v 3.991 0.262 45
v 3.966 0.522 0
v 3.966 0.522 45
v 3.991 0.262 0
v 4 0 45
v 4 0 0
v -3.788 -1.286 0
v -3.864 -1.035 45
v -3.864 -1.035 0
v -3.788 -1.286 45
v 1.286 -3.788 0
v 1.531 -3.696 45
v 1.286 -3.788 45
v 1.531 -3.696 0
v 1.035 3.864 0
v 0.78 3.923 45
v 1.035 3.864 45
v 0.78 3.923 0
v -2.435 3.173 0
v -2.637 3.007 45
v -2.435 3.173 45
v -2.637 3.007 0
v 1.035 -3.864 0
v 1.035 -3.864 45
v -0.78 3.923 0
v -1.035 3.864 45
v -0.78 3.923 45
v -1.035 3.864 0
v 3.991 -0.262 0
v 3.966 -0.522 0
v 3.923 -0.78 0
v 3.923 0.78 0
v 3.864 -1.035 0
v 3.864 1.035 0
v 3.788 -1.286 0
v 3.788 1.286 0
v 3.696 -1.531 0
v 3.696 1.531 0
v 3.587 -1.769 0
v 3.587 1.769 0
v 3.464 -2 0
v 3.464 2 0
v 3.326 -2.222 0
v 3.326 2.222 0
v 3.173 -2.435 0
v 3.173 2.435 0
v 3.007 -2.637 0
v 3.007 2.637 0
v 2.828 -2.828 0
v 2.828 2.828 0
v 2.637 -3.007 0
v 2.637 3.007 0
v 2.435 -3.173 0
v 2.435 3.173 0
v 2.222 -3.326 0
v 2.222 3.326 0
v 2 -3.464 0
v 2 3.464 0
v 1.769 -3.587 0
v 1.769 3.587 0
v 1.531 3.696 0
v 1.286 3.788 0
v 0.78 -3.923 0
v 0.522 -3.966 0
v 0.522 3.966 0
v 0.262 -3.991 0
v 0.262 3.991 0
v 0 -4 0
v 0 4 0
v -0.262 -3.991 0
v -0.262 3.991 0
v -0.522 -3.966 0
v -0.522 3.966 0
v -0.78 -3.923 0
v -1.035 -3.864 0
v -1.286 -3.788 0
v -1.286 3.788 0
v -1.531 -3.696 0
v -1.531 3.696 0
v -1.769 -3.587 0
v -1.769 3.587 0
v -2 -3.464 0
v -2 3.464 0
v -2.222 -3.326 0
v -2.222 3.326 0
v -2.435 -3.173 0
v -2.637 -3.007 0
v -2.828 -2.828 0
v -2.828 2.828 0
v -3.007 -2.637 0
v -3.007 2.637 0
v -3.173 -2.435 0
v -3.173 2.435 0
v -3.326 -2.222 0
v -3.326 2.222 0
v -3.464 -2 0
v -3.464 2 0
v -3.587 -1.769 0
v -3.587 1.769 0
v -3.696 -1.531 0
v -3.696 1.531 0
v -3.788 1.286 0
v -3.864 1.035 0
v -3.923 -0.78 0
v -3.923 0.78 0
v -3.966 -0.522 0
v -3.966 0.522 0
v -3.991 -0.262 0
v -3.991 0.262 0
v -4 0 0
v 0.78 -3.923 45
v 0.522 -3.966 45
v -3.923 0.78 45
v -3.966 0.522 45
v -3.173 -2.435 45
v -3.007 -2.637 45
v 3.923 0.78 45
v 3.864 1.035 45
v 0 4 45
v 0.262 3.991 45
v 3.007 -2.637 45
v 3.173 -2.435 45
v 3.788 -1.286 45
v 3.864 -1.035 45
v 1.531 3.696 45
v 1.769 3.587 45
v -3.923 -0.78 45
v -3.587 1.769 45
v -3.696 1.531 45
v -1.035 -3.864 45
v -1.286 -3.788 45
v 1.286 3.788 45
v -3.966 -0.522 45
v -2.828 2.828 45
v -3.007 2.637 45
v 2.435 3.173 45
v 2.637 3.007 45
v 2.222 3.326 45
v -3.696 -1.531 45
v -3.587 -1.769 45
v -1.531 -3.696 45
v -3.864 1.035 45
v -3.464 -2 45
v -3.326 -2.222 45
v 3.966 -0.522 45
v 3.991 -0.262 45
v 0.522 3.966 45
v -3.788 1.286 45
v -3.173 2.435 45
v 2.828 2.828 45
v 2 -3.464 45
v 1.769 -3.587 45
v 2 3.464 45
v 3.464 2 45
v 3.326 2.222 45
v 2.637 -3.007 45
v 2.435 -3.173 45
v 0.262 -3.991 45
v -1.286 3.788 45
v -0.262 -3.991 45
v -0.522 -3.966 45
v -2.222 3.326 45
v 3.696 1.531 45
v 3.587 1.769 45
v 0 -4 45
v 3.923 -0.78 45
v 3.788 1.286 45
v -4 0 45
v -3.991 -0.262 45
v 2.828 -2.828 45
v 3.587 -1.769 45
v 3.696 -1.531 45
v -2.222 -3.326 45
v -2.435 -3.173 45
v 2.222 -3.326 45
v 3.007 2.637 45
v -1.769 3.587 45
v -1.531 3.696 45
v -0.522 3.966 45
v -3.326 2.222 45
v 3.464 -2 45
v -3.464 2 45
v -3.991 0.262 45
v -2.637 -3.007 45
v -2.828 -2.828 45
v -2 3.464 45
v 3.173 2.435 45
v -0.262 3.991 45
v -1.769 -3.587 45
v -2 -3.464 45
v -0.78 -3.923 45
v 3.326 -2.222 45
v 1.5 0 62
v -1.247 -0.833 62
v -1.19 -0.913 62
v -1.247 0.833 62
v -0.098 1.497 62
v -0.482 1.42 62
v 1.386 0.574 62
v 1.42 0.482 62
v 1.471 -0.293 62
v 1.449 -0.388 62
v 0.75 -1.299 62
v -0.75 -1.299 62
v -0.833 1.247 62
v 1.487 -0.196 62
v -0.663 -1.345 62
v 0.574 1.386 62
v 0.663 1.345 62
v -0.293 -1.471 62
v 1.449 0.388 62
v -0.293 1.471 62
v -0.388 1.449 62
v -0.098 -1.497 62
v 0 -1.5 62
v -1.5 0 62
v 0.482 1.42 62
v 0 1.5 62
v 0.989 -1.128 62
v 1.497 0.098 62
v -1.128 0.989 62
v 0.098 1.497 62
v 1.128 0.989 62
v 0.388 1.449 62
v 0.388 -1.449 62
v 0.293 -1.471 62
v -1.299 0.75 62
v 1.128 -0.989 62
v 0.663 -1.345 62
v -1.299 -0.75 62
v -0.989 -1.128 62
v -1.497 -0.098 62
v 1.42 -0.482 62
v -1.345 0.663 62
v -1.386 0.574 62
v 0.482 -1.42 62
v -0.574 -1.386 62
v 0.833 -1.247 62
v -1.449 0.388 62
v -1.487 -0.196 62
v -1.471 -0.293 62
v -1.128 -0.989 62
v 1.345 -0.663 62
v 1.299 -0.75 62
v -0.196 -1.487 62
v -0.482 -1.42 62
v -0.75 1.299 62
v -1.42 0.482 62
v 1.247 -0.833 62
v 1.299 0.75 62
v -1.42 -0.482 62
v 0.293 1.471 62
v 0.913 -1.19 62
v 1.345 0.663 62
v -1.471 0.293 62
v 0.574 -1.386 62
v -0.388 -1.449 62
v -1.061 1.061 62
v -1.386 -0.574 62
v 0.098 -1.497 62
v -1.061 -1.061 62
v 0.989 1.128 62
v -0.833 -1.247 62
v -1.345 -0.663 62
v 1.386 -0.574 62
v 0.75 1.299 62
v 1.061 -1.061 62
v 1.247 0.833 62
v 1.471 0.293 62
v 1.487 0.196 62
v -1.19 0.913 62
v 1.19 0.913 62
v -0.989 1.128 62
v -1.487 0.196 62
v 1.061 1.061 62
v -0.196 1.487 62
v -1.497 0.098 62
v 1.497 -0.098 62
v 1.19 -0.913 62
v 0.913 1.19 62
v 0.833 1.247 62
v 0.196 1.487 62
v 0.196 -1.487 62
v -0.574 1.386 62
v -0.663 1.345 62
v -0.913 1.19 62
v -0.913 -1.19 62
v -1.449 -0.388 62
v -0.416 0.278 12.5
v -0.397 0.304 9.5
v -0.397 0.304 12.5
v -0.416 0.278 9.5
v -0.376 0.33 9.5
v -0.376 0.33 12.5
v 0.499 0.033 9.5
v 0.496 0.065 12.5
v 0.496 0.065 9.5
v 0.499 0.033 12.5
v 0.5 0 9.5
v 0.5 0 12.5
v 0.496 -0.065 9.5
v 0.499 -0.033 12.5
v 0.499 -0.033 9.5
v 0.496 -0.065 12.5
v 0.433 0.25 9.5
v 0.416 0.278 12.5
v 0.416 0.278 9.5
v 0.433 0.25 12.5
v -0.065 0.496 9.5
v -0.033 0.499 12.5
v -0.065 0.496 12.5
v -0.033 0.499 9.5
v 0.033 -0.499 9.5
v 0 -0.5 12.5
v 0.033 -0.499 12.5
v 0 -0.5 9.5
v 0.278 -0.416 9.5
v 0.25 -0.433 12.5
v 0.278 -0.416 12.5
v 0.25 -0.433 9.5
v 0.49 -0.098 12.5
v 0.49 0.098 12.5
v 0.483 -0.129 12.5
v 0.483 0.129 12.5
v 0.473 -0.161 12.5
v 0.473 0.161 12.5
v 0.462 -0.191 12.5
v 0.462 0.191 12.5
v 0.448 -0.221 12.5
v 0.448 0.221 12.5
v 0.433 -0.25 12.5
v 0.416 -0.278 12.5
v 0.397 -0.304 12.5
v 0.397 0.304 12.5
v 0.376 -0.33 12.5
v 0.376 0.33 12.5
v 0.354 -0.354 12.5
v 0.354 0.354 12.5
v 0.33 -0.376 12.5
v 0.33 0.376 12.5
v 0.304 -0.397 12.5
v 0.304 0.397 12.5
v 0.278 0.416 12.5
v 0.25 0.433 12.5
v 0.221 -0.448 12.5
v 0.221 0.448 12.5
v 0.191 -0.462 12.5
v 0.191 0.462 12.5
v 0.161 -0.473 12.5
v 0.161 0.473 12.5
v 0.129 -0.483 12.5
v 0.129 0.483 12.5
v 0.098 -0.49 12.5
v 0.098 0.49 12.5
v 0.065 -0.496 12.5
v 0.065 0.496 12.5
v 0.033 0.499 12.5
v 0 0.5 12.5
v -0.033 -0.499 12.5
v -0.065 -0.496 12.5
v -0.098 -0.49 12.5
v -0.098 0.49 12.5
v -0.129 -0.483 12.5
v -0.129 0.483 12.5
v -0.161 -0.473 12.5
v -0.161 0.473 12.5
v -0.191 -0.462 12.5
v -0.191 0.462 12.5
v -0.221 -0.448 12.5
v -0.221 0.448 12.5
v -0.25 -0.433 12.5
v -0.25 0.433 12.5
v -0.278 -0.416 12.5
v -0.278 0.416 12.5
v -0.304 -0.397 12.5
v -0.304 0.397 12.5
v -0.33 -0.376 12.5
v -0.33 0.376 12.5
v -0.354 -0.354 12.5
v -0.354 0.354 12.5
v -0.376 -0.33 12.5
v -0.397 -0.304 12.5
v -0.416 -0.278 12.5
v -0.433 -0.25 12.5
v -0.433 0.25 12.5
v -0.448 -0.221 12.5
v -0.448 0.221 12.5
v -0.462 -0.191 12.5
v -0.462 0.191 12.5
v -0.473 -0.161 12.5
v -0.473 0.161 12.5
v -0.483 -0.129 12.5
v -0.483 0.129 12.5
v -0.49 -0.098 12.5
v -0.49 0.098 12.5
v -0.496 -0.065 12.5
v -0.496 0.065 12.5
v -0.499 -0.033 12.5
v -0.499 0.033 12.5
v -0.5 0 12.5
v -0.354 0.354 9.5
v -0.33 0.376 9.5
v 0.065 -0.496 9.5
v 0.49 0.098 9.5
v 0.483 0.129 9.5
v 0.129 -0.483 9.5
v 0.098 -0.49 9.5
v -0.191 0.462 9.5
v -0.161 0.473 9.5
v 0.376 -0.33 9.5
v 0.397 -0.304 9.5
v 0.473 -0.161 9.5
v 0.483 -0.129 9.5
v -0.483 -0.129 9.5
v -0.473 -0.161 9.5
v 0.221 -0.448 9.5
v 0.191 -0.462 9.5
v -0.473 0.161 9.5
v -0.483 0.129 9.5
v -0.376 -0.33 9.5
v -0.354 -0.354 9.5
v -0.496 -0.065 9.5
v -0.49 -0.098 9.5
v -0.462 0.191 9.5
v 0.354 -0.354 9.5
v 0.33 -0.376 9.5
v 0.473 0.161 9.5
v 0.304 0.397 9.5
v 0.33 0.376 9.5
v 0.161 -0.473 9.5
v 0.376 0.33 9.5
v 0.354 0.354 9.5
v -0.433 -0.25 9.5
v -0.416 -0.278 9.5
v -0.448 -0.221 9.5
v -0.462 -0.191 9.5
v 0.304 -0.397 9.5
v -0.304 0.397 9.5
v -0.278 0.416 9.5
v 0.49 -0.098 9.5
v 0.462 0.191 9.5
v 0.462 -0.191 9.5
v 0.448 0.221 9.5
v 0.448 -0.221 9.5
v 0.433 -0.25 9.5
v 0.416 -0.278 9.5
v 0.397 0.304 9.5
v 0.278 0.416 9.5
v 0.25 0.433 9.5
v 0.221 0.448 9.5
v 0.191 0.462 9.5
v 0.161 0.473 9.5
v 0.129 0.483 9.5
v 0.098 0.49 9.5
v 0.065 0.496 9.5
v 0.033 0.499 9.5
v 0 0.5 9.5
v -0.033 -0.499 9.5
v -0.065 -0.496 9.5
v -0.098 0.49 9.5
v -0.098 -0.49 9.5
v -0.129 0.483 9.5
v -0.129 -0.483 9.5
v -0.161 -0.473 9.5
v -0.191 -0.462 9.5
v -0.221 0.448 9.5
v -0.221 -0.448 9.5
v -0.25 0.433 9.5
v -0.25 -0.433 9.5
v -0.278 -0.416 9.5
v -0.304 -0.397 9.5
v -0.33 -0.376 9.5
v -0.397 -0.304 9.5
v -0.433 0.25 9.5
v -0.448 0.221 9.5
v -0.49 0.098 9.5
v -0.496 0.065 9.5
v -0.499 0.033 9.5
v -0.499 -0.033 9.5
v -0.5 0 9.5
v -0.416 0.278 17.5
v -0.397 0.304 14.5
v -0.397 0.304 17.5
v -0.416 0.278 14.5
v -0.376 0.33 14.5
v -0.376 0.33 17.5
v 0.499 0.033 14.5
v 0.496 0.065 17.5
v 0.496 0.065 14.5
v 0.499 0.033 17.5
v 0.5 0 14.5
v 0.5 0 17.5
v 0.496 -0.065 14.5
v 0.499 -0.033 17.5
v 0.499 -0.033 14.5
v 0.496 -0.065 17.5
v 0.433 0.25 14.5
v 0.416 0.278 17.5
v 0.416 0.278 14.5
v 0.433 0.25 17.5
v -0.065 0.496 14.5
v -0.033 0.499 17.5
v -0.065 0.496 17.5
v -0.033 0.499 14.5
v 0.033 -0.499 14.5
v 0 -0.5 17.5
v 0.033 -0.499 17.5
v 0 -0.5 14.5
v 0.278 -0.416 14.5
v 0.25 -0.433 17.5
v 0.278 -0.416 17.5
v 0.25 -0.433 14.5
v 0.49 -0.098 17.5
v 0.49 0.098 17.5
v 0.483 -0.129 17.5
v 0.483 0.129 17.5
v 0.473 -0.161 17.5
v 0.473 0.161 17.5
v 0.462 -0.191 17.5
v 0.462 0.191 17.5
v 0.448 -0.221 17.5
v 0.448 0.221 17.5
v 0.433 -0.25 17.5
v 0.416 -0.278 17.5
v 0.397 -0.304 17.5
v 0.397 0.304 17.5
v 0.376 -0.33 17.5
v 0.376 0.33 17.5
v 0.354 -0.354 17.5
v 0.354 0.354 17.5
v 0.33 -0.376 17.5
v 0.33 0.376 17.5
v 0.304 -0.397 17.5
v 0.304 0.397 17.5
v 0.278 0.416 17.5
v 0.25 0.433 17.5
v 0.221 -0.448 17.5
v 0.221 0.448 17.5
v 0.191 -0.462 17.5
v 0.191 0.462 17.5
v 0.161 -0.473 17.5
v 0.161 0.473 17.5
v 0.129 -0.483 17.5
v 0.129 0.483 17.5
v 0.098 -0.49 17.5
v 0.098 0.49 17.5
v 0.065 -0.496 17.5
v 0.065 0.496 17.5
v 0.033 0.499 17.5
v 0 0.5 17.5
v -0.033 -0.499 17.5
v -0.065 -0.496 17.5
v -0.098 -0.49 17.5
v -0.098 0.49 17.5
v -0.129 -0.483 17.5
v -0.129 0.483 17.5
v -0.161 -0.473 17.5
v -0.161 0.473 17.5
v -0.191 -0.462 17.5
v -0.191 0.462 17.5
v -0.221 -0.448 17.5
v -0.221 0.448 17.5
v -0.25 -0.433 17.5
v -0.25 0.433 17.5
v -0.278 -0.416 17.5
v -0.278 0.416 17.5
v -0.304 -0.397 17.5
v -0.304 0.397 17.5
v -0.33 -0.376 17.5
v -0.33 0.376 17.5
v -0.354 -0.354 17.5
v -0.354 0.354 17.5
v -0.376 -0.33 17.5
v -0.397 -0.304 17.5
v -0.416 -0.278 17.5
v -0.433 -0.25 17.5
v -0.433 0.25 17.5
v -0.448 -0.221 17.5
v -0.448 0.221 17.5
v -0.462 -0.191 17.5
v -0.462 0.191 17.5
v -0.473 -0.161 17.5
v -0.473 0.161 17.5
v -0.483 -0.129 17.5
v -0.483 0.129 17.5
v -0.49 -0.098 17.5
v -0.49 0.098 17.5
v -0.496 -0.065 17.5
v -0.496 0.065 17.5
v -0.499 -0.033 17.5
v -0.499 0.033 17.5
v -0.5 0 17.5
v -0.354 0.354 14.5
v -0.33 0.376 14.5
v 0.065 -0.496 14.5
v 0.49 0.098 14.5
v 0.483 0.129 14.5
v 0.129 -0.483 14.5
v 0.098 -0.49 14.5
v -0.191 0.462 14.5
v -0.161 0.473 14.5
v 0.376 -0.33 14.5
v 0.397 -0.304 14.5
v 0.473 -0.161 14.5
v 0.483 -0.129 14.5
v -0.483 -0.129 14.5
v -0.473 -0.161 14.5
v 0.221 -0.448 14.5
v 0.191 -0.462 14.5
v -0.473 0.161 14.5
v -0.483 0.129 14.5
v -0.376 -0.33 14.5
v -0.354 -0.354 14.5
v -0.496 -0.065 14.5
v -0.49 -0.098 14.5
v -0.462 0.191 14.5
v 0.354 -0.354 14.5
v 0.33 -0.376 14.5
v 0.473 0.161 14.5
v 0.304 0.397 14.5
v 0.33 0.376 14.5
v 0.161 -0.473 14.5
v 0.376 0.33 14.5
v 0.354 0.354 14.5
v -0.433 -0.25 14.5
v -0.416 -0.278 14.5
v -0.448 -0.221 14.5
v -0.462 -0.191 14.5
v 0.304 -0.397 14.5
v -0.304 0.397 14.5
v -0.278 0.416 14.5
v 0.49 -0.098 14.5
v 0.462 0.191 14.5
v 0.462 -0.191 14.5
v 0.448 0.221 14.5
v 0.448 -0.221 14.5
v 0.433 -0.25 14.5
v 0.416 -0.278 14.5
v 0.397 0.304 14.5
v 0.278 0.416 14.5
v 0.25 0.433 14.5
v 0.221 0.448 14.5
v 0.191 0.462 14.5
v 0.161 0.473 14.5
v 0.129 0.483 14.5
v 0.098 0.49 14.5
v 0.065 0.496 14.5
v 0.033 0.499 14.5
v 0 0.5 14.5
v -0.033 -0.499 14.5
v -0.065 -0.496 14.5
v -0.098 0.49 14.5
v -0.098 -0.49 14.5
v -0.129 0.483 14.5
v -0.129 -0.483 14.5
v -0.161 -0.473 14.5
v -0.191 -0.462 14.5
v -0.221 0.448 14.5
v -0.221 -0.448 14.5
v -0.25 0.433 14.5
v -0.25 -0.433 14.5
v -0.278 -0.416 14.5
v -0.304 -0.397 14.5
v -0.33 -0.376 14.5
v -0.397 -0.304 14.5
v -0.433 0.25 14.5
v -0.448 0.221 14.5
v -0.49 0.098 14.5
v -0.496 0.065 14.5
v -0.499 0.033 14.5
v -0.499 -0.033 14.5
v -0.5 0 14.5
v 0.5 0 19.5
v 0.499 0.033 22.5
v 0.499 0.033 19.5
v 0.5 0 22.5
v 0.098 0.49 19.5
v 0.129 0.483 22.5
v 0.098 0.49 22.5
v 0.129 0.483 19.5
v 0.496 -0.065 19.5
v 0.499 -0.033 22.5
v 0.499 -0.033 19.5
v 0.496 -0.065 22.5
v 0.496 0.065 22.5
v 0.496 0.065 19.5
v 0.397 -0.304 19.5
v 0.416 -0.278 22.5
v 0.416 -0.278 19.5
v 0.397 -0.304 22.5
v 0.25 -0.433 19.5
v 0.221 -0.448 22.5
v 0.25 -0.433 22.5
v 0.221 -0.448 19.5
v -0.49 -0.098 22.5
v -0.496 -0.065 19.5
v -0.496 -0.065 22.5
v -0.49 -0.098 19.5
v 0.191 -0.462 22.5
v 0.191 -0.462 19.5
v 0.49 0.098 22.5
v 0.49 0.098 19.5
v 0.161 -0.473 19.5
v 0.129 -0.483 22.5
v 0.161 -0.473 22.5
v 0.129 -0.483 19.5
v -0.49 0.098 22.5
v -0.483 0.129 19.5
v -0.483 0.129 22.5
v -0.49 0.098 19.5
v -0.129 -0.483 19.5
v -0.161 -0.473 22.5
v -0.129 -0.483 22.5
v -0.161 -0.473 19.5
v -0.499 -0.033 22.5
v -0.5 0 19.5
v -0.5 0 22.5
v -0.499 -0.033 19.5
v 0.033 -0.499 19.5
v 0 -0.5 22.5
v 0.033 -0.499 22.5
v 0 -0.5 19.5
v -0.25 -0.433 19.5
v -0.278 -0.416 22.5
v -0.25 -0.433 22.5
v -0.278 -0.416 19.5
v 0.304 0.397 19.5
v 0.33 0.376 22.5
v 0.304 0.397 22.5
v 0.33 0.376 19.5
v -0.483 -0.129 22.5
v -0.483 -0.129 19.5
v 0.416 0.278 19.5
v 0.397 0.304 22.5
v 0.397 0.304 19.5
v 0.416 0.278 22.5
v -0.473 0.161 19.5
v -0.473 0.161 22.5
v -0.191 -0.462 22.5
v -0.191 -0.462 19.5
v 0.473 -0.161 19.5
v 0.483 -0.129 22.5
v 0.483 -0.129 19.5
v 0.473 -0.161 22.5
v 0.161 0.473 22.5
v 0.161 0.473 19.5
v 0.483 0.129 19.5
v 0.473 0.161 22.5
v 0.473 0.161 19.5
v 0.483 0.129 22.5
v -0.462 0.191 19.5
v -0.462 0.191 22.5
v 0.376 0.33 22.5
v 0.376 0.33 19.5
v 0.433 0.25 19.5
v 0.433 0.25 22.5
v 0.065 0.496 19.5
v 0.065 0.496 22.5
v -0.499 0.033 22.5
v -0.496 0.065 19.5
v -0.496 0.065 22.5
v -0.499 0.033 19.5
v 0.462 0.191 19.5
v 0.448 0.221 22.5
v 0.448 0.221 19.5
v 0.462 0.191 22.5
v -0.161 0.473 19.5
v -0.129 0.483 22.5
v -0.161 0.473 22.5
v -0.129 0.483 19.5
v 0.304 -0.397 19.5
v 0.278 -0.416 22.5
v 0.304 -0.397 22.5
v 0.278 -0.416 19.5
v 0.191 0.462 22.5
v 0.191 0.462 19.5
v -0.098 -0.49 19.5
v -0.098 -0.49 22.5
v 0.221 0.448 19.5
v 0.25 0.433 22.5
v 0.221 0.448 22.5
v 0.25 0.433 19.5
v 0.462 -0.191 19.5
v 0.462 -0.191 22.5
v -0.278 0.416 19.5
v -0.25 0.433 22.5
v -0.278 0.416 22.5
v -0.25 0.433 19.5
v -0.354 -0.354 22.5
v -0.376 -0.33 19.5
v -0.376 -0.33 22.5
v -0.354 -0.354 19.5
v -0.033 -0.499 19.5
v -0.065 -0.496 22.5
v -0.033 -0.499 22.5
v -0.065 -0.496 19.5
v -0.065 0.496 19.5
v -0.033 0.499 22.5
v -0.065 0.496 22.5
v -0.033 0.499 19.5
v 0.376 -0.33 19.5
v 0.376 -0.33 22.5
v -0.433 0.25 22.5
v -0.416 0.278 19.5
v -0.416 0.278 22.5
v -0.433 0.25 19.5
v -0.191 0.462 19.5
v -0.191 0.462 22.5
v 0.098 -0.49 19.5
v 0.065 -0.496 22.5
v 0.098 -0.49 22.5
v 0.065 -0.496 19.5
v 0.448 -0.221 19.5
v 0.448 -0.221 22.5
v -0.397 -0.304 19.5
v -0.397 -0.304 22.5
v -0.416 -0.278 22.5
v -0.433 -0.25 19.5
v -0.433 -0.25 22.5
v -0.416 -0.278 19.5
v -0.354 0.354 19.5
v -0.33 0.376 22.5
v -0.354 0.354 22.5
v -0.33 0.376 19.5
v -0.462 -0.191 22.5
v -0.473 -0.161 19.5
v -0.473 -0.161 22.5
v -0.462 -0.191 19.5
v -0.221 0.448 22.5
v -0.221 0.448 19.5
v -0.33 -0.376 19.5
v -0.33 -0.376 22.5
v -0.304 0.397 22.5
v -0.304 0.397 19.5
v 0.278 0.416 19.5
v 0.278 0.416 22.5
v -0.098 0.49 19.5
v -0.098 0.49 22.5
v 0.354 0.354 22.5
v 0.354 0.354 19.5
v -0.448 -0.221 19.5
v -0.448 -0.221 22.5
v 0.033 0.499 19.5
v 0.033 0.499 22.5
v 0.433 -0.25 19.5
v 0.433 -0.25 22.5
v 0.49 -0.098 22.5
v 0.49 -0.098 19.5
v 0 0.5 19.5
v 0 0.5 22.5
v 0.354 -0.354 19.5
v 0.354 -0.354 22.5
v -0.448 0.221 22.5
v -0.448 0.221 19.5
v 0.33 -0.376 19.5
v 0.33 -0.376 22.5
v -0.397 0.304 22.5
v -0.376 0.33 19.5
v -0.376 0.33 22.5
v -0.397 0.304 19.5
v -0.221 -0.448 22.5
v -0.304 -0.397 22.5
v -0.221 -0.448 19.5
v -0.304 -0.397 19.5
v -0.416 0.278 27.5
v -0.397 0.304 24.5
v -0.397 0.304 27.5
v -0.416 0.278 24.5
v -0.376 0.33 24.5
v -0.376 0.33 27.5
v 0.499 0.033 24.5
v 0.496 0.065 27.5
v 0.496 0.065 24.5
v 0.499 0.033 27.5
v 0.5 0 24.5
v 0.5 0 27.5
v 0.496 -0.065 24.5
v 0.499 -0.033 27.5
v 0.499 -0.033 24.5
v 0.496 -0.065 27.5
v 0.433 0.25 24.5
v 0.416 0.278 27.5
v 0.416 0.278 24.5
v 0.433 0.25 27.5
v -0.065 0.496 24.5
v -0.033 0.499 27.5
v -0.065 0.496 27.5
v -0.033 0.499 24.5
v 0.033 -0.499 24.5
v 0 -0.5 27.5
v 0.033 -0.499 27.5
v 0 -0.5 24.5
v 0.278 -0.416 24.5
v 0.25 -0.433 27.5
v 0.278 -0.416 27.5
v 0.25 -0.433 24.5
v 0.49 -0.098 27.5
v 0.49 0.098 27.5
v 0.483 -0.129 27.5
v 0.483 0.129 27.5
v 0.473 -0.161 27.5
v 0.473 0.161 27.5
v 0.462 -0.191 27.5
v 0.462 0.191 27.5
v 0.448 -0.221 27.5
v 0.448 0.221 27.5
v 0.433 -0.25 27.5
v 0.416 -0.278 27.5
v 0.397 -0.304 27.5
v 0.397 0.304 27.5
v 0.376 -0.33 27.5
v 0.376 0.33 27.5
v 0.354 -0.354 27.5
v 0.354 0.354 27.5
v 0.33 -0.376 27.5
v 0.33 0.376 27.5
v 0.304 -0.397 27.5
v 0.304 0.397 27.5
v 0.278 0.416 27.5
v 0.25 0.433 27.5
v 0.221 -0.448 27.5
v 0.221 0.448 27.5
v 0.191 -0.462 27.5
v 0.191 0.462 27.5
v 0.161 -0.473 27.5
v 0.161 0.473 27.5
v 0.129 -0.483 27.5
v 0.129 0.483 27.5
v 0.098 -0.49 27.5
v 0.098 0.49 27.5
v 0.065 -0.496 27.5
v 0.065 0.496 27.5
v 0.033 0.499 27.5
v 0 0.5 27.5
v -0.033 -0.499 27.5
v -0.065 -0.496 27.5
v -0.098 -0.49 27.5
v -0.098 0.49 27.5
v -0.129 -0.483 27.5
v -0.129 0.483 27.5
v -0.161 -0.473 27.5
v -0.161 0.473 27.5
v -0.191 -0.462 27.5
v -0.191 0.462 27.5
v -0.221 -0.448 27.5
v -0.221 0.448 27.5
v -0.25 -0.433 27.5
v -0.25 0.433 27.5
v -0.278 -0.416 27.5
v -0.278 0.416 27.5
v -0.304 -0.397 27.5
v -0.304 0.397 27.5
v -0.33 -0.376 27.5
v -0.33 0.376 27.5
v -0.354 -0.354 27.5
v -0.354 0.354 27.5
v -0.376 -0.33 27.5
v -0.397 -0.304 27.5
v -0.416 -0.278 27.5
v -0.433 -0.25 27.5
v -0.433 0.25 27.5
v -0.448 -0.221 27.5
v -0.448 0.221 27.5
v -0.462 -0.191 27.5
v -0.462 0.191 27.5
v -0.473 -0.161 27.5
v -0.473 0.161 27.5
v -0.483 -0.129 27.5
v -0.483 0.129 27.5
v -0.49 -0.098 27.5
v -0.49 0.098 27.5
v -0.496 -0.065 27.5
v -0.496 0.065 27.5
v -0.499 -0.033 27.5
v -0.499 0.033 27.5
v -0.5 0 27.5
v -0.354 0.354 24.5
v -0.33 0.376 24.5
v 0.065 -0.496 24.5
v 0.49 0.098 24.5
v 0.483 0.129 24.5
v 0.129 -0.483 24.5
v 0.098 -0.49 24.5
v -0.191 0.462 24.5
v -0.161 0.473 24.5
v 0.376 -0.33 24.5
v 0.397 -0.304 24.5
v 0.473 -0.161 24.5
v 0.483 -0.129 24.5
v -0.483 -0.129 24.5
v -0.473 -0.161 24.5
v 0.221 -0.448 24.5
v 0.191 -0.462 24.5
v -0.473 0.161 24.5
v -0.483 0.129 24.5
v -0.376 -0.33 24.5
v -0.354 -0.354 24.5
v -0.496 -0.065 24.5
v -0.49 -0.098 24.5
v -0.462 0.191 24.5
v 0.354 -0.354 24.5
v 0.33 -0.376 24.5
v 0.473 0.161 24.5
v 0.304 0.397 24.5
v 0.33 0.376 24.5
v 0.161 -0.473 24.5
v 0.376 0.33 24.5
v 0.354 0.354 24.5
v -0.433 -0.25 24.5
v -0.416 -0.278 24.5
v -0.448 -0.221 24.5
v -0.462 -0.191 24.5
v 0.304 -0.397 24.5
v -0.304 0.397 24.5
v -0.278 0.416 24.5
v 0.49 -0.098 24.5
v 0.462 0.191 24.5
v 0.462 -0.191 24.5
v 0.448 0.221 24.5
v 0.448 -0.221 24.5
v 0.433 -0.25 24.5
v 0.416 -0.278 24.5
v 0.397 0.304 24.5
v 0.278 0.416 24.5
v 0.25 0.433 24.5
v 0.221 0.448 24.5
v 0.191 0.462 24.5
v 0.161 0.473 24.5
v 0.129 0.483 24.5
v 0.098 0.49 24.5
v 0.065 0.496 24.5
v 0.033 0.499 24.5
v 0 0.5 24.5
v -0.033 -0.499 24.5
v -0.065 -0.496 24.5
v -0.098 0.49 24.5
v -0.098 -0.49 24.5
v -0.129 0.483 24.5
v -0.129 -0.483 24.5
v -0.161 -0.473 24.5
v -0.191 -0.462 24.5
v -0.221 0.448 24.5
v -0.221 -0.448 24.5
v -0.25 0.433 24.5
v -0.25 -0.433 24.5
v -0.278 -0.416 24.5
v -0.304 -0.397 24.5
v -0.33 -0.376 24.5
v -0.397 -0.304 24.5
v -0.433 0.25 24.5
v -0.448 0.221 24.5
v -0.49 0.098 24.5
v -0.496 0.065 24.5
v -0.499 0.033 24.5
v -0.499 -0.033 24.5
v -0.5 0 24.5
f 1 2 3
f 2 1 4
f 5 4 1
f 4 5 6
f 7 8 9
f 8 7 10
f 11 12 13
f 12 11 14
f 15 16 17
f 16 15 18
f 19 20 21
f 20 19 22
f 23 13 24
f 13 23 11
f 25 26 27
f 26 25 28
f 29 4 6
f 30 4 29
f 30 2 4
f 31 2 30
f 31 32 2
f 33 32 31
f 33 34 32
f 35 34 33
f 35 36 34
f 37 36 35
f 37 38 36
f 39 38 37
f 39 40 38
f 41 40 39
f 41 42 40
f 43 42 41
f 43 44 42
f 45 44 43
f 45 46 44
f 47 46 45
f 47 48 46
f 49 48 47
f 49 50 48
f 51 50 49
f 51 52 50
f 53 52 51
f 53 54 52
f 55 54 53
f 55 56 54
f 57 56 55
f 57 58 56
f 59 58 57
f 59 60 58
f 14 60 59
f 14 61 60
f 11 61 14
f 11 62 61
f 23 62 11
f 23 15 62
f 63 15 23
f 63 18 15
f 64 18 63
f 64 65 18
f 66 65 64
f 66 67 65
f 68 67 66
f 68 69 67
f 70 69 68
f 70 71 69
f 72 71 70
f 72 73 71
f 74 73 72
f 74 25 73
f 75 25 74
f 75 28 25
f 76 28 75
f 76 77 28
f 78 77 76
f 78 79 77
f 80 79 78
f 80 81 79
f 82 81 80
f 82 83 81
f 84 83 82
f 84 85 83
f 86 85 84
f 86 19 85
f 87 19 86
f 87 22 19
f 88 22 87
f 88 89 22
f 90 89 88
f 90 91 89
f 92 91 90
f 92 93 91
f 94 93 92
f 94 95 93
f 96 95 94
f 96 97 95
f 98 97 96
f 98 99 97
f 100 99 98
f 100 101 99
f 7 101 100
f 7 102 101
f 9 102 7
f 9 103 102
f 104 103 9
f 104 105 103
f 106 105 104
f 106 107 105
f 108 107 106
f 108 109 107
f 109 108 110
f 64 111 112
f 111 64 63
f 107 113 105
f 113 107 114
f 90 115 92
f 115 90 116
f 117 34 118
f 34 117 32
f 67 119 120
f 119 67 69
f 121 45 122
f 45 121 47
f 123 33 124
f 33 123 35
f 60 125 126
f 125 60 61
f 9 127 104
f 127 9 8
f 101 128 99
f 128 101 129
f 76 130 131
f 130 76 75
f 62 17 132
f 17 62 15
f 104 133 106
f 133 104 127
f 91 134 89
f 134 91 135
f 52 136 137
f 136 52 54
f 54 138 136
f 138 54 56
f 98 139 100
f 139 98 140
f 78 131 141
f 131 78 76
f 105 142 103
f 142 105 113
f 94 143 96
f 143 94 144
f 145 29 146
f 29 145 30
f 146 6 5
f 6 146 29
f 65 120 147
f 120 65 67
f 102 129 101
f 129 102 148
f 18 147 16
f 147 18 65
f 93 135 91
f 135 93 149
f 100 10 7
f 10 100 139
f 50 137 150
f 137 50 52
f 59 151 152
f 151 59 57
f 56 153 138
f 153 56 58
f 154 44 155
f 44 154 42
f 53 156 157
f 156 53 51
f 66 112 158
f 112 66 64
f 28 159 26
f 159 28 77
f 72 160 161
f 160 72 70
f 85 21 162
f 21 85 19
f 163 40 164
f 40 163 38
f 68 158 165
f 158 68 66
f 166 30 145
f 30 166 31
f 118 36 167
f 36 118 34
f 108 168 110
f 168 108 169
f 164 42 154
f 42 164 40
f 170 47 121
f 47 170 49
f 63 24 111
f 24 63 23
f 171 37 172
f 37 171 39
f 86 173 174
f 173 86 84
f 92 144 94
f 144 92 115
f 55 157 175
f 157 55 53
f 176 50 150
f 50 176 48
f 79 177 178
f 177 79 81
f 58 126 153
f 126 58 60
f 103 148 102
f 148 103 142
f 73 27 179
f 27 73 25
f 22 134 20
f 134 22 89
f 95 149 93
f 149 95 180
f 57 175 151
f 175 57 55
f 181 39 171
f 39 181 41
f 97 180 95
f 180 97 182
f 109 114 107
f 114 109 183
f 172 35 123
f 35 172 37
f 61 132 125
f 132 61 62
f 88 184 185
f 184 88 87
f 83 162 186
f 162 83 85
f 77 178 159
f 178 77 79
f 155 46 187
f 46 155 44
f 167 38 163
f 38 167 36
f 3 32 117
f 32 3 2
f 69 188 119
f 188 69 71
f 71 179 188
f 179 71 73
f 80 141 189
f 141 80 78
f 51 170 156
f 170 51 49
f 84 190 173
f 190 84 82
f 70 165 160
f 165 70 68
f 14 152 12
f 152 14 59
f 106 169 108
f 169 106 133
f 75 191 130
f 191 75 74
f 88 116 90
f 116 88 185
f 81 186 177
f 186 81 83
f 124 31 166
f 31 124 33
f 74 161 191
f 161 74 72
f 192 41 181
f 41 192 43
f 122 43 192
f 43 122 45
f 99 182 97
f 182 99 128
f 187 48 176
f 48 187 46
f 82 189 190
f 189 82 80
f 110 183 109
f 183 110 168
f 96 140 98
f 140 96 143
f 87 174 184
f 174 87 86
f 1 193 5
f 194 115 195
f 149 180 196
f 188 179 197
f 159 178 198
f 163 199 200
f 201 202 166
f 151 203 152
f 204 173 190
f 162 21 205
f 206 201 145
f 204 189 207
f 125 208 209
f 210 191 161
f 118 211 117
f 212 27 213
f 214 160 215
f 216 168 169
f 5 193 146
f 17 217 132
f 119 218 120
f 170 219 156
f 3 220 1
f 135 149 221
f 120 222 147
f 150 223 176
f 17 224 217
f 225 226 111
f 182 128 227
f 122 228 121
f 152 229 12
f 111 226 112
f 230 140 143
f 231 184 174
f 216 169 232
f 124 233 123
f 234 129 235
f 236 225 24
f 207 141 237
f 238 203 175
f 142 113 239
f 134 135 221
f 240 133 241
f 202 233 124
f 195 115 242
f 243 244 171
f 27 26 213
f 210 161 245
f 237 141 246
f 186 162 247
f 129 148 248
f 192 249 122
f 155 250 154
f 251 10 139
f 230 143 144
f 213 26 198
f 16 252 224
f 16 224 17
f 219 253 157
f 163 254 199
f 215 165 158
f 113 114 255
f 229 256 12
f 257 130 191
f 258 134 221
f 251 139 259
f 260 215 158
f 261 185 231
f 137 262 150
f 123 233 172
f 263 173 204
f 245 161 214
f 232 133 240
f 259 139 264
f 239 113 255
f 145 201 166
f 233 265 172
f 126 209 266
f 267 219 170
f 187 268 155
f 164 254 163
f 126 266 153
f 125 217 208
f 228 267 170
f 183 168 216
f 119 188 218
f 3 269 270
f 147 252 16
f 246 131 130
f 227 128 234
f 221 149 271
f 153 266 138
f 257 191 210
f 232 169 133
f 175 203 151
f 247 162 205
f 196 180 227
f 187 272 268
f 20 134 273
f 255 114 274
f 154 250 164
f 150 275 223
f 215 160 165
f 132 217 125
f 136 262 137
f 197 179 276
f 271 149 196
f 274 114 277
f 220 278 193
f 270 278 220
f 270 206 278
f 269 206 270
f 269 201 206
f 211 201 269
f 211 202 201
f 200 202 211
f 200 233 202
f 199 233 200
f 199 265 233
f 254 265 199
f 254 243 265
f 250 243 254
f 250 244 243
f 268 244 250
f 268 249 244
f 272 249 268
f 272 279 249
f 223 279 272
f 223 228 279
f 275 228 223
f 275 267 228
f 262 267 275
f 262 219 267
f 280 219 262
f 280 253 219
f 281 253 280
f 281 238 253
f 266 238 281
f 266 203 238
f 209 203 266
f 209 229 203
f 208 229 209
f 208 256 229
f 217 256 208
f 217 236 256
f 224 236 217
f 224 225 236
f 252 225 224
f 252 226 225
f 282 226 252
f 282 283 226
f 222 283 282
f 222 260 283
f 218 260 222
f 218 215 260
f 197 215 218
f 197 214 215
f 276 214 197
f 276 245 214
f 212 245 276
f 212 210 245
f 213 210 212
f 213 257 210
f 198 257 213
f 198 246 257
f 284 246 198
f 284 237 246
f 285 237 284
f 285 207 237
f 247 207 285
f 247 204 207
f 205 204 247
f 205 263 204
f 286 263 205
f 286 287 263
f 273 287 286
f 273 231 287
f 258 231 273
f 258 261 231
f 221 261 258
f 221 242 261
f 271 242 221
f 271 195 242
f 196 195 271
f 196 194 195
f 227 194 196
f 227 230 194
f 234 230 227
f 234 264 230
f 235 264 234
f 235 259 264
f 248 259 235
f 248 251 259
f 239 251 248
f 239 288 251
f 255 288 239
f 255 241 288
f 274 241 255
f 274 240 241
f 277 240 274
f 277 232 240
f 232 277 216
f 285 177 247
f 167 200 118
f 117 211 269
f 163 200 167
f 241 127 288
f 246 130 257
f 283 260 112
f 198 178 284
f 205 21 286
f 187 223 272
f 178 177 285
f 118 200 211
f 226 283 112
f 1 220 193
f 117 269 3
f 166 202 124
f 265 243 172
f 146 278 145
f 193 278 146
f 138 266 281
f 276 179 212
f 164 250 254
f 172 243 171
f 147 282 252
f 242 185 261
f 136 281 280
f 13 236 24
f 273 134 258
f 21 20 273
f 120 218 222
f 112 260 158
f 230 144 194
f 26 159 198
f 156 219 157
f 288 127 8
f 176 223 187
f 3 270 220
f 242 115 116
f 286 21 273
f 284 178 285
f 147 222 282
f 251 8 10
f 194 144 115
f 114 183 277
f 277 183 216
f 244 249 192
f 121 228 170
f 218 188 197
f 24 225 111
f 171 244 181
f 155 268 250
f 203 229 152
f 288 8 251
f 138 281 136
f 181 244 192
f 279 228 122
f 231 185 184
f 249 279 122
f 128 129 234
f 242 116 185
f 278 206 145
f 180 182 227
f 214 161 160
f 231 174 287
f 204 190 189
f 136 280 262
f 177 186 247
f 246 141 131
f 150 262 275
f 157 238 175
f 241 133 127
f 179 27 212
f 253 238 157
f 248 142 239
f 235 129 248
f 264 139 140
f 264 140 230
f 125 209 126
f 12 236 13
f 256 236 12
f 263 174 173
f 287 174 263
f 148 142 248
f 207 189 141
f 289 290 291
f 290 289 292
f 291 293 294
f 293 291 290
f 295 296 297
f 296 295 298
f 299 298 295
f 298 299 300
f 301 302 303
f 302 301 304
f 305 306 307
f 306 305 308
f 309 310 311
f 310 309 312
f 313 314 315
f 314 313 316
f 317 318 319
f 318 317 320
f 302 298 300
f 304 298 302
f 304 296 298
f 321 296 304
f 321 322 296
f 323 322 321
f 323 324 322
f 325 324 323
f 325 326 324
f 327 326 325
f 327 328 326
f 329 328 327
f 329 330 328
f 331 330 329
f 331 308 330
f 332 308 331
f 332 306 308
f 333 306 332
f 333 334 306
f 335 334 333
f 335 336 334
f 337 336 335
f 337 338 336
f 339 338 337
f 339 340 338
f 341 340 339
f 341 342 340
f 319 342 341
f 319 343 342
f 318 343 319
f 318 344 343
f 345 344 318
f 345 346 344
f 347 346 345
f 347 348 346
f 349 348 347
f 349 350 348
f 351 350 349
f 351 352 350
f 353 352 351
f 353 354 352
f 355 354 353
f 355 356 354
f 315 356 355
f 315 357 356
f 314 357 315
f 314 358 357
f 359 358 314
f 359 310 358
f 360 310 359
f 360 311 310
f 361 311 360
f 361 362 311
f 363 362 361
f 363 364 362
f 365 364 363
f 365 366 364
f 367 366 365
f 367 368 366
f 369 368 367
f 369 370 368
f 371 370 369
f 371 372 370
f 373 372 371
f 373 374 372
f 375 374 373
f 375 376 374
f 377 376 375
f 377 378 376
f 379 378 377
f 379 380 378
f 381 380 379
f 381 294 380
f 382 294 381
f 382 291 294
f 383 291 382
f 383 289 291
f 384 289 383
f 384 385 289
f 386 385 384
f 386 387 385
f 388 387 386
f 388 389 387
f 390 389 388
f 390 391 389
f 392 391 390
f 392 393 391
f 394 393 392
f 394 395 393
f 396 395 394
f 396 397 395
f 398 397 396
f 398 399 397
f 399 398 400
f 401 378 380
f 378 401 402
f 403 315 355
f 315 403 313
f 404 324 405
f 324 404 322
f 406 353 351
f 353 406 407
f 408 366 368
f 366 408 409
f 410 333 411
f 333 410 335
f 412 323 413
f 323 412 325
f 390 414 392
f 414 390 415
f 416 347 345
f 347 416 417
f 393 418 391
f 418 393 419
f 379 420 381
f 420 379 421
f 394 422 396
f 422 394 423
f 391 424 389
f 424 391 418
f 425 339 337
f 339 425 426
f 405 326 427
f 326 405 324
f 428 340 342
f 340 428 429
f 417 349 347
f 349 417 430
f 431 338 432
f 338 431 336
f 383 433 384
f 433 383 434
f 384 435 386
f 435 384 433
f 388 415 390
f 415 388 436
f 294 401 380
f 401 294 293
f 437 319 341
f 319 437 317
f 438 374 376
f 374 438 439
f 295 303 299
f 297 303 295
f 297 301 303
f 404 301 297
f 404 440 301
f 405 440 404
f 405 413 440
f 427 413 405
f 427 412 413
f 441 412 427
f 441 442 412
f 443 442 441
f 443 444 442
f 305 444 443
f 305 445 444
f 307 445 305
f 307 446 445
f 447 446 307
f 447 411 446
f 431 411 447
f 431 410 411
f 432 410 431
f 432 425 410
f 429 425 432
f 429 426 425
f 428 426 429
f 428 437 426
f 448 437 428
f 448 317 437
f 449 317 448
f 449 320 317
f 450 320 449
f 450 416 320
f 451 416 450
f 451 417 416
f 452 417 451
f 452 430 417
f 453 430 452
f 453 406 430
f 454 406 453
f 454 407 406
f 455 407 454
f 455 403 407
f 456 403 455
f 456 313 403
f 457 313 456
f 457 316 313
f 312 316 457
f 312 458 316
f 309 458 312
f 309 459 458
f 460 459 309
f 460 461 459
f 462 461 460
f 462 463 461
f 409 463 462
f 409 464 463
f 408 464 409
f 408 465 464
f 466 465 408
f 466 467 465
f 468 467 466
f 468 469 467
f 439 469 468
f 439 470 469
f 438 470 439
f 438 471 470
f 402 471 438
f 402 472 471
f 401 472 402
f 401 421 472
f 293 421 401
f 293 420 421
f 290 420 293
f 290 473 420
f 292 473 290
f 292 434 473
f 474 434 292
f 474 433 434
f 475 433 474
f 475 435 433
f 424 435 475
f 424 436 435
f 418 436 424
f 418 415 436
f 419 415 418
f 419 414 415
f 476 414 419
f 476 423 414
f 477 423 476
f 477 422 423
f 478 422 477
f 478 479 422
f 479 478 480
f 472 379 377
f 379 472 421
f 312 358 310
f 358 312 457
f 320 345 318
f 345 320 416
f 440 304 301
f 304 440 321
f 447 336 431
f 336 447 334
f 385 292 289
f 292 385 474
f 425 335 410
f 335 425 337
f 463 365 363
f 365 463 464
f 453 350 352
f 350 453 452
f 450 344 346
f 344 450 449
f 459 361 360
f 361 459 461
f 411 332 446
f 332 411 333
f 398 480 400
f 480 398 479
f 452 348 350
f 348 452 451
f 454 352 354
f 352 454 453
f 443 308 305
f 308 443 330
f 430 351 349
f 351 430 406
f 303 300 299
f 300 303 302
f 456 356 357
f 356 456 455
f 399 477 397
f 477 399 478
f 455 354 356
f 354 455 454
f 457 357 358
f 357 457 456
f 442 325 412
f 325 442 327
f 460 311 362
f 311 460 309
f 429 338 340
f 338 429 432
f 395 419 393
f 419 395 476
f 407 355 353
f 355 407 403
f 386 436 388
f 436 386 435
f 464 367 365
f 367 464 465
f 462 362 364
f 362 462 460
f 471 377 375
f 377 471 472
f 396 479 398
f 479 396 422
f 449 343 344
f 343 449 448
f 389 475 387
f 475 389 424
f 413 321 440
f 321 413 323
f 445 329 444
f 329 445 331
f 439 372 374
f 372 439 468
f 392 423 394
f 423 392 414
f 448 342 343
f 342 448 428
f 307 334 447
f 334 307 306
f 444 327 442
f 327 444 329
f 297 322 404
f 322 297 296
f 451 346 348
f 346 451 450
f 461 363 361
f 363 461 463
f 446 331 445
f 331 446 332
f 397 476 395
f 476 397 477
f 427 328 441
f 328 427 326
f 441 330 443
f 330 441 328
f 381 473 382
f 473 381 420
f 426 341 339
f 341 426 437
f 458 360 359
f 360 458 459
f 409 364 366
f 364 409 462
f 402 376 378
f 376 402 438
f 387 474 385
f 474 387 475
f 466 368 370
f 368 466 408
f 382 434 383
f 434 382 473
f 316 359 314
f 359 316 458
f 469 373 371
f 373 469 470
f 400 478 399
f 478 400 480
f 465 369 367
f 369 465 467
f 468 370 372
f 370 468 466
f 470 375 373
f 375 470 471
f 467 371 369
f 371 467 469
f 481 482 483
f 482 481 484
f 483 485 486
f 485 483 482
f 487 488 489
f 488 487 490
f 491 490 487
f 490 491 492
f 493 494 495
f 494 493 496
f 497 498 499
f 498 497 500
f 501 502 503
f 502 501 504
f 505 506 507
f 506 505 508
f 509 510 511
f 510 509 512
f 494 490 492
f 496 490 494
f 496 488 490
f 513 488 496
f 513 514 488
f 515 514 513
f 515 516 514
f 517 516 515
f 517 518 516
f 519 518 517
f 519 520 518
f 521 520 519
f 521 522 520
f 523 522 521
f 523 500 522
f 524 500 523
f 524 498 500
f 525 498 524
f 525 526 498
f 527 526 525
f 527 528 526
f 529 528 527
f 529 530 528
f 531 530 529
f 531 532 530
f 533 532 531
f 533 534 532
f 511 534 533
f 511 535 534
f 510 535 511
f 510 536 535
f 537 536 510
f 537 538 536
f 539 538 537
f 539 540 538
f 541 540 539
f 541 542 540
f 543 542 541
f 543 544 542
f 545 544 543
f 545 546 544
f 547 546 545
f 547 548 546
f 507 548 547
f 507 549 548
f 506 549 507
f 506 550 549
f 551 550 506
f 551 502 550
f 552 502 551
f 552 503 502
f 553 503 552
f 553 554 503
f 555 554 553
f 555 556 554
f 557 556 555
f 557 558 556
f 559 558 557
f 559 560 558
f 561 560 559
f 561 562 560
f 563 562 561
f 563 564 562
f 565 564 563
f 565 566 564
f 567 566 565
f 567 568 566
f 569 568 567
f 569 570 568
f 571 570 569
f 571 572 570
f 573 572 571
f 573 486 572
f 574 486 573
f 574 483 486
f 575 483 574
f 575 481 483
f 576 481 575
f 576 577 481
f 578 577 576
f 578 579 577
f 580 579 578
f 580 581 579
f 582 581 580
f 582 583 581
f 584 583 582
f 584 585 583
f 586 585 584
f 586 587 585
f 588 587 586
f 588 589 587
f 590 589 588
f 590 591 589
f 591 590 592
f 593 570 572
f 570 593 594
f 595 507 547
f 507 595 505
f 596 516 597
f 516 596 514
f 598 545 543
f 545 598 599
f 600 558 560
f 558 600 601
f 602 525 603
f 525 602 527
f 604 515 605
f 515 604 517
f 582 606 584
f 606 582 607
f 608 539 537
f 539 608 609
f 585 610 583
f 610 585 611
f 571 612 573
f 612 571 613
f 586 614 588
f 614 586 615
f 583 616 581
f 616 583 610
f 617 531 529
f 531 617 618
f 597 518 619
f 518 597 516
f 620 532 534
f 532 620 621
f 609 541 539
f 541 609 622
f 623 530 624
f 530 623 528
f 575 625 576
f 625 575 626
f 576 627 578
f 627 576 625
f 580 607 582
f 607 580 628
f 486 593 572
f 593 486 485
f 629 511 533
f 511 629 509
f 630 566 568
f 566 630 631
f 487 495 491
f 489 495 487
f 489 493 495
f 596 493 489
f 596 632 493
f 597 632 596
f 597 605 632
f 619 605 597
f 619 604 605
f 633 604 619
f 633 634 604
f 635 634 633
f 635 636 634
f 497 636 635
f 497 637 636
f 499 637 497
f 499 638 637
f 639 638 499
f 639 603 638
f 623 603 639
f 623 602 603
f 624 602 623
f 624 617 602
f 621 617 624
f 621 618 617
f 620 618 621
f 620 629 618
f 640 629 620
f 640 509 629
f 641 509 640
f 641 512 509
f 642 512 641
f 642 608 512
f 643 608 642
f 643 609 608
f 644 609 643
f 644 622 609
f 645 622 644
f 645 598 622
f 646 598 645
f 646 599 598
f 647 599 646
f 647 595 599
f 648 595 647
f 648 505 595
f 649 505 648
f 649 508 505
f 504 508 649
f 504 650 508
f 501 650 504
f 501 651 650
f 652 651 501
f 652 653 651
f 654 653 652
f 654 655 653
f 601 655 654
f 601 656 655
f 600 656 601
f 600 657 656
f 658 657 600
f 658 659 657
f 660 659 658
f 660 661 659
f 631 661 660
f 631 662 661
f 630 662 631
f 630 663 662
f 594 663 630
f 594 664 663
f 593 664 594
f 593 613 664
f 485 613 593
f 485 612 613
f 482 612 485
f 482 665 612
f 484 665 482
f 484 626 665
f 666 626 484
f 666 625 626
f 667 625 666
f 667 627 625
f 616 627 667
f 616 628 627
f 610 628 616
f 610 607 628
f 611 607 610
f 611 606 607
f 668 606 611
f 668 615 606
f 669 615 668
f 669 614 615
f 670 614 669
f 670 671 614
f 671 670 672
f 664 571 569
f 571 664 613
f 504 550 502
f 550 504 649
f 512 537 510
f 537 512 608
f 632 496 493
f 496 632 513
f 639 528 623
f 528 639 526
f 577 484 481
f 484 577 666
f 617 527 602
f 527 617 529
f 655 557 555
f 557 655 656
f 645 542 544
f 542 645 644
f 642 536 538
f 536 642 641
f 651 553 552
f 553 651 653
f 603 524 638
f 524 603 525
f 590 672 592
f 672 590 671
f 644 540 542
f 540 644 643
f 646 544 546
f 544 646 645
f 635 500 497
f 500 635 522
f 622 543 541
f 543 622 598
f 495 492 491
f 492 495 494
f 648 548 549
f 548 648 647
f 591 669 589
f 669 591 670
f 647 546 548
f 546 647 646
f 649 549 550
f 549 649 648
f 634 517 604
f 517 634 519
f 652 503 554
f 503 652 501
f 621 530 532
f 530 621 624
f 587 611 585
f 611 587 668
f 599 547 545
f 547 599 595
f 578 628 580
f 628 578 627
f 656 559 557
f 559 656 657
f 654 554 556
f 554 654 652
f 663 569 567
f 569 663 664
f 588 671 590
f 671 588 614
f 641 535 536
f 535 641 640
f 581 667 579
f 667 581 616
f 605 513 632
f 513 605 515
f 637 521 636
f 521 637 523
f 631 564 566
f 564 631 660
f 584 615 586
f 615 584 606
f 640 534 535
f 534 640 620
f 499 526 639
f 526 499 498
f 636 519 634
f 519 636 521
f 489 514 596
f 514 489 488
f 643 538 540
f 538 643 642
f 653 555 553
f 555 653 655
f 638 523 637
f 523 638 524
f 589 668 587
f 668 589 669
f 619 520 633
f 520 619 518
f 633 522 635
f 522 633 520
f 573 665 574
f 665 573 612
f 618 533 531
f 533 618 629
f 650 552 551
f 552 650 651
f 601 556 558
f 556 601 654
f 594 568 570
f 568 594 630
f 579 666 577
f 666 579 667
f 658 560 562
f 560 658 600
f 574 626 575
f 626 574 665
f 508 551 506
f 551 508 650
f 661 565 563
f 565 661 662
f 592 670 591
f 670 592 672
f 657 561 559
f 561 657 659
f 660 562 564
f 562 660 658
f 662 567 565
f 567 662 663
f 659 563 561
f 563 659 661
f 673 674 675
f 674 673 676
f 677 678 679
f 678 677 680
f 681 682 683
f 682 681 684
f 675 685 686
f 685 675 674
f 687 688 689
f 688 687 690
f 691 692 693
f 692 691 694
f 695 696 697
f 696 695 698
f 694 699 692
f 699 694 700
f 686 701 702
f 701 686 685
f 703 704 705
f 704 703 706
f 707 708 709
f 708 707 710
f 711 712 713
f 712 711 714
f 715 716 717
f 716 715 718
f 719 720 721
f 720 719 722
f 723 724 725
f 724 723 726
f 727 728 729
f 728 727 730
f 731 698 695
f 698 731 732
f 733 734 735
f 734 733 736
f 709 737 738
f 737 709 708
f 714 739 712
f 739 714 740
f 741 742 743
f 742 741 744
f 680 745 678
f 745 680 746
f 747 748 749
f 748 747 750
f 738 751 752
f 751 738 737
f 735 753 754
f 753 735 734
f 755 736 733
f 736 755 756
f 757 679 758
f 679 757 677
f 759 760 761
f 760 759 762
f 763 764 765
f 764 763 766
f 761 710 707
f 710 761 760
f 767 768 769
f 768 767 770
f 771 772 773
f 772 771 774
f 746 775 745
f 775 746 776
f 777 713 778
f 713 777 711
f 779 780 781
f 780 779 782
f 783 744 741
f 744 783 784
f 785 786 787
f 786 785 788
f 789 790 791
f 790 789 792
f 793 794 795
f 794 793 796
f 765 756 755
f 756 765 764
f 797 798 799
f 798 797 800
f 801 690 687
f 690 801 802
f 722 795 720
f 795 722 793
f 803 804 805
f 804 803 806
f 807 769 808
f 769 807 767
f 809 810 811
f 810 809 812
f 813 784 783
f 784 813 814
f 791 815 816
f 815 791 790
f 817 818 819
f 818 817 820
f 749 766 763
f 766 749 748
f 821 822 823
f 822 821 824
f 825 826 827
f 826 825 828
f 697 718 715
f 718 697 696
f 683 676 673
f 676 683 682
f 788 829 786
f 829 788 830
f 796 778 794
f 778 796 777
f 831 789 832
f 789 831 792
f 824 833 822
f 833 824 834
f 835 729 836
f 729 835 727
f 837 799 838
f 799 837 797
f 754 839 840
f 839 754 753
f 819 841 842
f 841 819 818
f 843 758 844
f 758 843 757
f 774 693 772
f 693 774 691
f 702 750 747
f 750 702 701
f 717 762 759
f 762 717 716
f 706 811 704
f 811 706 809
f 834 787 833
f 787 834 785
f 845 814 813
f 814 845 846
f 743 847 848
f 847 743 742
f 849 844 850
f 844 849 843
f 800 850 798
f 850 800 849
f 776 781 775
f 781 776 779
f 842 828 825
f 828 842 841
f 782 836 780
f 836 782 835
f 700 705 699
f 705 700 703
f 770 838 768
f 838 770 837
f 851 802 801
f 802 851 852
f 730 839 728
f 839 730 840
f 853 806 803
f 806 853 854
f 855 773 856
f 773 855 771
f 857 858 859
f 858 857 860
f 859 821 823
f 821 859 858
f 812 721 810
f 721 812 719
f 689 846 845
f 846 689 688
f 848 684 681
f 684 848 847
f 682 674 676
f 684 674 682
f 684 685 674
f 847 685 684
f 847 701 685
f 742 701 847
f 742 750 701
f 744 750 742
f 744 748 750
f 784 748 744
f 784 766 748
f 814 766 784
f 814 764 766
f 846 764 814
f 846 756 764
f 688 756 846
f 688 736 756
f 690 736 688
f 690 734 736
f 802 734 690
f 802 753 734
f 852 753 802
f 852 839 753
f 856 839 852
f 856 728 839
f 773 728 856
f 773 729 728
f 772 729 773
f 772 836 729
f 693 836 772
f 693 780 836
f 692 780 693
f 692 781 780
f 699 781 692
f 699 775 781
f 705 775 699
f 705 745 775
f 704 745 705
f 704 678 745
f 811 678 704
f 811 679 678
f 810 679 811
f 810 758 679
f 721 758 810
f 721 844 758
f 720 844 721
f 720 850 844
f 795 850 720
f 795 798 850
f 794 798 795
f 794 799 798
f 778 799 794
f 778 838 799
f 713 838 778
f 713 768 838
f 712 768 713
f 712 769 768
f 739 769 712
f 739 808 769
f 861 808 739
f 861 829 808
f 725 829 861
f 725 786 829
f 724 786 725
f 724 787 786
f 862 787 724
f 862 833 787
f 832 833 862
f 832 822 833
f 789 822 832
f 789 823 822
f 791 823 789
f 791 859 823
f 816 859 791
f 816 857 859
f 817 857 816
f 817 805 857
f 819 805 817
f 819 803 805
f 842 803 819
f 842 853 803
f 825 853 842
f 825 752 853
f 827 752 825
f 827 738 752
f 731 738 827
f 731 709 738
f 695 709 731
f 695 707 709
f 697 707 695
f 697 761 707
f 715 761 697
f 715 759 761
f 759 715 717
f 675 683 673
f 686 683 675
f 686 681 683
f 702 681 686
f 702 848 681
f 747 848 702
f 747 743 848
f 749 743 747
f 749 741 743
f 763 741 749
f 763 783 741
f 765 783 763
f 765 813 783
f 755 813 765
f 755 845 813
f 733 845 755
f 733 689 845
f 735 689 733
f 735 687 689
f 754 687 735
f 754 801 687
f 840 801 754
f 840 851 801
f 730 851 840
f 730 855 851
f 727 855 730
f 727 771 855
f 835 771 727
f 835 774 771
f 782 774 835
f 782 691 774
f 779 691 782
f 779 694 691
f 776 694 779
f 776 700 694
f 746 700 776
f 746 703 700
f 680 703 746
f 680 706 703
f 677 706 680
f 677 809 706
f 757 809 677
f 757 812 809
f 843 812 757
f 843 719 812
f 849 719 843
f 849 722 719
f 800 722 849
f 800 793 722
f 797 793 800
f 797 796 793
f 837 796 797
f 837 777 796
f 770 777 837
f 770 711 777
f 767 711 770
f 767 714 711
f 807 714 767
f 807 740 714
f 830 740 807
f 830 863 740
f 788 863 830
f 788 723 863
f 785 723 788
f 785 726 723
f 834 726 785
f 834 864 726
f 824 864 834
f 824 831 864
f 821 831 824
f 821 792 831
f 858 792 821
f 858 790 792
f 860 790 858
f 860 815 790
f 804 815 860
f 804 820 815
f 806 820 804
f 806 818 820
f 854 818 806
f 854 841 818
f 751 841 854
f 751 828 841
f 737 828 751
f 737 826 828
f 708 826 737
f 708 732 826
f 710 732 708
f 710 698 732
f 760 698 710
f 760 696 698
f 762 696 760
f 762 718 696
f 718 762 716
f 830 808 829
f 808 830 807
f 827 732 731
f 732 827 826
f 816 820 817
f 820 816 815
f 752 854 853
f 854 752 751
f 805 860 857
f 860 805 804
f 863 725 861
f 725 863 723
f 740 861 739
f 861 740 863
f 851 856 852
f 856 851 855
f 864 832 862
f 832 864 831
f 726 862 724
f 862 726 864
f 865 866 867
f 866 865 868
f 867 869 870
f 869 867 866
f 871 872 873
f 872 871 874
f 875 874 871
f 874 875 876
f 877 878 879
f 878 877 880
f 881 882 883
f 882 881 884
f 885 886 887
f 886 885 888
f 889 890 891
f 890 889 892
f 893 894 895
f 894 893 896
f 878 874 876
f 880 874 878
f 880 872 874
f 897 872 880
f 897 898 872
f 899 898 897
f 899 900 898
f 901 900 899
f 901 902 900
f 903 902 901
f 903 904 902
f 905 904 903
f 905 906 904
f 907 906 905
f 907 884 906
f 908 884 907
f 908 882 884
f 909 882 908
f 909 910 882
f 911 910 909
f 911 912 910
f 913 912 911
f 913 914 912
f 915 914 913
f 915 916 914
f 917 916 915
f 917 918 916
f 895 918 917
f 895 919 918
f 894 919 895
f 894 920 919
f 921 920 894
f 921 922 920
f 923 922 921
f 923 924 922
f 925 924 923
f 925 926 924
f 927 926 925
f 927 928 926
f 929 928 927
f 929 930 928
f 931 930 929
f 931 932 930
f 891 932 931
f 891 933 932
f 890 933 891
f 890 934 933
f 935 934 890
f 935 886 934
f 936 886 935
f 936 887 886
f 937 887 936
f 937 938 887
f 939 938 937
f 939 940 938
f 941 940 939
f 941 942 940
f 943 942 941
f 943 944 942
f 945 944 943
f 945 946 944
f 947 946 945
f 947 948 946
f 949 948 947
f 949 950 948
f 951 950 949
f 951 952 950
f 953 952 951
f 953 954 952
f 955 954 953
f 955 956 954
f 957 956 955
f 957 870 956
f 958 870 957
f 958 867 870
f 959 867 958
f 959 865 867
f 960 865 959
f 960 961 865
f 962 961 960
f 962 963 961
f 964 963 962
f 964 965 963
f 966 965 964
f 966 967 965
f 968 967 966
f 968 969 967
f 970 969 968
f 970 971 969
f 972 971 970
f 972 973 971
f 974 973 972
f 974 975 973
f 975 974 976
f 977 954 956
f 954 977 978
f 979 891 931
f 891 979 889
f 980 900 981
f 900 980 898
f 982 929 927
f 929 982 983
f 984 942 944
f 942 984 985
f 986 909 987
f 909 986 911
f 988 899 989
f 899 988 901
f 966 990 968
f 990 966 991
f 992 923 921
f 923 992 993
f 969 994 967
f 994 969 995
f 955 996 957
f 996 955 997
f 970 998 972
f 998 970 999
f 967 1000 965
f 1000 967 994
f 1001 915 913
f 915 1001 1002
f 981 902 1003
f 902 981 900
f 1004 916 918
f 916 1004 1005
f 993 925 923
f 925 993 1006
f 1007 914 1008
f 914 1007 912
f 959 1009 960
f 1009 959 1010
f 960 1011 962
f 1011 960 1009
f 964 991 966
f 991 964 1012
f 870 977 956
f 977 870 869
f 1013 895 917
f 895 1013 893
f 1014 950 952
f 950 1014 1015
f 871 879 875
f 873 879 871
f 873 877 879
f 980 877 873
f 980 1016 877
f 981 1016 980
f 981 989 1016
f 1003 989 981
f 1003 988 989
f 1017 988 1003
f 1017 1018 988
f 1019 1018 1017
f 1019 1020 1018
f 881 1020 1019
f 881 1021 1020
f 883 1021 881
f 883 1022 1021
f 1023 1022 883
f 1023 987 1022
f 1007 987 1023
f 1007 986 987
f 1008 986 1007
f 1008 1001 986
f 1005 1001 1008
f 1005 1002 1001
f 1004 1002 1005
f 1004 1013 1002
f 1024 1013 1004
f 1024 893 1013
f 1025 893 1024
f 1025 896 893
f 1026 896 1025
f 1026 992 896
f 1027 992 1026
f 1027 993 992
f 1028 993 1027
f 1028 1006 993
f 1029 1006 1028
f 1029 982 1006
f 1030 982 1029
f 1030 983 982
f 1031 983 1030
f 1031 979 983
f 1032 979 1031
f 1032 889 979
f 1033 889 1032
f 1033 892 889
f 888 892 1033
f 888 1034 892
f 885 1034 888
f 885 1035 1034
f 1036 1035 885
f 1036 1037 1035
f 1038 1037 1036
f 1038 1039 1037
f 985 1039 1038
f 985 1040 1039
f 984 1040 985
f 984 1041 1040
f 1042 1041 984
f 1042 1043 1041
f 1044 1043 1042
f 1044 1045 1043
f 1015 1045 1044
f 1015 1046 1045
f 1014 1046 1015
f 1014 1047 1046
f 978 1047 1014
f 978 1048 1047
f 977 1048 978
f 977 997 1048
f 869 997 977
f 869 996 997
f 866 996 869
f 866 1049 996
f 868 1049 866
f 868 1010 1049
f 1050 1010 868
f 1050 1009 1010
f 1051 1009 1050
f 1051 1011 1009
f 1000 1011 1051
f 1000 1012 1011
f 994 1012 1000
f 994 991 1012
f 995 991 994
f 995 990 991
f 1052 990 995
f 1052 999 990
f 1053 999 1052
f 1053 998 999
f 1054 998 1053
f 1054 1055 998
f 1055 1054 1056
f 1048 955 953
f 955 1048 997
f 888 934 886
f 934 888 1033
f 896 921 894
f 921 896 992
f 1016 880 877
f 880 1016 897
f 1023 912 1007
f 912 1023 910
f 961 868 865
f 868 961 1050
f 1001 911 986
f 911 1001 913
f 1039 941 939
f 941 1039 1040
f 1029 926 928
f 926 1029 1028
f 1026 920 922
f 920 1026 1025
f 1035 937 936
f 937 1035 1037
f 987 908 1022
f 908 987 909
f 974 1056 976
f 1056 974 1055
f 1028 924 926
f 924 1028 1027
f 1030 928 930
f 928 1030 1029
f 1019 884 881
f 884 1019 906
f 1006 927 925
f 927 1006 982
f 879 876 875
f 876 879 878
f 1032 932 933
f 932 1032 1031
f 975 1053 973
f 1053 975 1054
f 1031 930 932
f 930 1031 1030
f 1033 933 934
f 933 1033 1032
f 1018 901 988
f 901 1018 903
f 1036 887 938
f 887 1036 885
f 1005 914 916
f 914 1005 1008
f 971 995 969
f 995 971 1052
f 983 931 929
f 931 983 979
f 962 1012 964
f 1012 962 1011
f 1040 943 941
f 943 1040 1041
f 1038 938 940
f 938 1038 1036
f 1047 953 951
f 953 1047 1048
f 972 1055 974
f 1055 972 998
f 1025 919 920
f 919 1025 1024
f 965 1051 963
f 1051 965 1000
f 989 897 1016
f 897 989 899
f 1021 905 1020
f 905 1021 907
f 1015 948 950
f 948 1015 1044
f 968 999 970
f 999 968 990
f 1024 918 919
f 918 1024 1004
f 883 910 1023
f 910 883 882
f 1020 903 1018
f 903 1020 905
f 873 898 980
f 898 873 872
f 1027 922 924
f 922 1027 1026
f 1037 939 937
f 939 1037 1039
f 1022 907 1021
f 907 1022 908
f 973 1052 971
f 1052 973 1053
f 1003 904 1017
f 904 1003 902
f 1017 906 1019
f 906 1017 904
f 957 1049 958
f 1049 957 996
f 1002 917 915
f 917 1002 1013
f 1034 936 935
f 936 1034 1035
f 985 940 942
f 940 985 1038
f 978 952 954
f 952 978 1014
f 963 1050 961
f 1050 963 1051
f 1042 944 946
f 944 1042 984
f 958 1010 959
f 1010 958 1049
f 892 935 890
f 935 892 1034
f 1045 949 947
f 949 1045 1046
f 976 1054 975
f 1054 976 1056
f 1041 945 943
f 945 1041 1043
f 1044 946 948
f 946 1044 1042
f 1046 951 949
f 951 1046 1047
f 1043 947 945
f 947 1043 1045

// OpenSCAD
// Pestle for grinding tissue inside a 1.5 mL microcentrifuge tube
// Print orientation: standing upright on the bed (z = 0)

// ---------------- Parameters ----------------
handle_d      = 8;    // handle diameter (mm)
handle_h      = 45;   // handle height (mm), z = 0 to 45

cone_top_d    = 8;    // cone diameter at handle junction (mm)
cone_bottom_d = 3;    // cone diameter at tip top (mm)
cone_h        = 17;   // cone height (mm), z = 45 to 62

tip_r         = 3;    // rounded tip radius (mm), centred at z = 62
tip_h         = 6;    // tip height above centre (mm)

groove_count  = 4;    // number of circumferential grooves
groove_w      = 2;    // groove width (mm), in Z
groove_depth  = 1;    // groove depth (mm)
groove_z      = [10, 15, 20, 25]; // groove centre heights (mm)

eps           = 0.5;  // overshoot for clean cuts (mm)

$fn = 96;             // curve resolution

// ---------------- Model ----------------
difference() {
    union() {
        // Handle
        cylinder(d = handle_d, h = handle_h);

        // Cone: from handle diameter down to tip top diameter
        translate([0, 0, handle_h])
            cylinder(d1 = cone_top_d, d2 = cone_bottom_d, h = cone_h);

        // Rounded tip: sphere centred at z = 62
        translate([0, 0, tip_h])
            sphere(r = tip_r);
    }

    // Grooves cut into the handle, extended past the faces they span
    for (i = [0 : groove_count - 1]) {
        z = groove_z[i];
        translate([0, 0, z - eps])
            cylinder(d = groove_depth, h = groove_w + 2 * eps);
    }
}
